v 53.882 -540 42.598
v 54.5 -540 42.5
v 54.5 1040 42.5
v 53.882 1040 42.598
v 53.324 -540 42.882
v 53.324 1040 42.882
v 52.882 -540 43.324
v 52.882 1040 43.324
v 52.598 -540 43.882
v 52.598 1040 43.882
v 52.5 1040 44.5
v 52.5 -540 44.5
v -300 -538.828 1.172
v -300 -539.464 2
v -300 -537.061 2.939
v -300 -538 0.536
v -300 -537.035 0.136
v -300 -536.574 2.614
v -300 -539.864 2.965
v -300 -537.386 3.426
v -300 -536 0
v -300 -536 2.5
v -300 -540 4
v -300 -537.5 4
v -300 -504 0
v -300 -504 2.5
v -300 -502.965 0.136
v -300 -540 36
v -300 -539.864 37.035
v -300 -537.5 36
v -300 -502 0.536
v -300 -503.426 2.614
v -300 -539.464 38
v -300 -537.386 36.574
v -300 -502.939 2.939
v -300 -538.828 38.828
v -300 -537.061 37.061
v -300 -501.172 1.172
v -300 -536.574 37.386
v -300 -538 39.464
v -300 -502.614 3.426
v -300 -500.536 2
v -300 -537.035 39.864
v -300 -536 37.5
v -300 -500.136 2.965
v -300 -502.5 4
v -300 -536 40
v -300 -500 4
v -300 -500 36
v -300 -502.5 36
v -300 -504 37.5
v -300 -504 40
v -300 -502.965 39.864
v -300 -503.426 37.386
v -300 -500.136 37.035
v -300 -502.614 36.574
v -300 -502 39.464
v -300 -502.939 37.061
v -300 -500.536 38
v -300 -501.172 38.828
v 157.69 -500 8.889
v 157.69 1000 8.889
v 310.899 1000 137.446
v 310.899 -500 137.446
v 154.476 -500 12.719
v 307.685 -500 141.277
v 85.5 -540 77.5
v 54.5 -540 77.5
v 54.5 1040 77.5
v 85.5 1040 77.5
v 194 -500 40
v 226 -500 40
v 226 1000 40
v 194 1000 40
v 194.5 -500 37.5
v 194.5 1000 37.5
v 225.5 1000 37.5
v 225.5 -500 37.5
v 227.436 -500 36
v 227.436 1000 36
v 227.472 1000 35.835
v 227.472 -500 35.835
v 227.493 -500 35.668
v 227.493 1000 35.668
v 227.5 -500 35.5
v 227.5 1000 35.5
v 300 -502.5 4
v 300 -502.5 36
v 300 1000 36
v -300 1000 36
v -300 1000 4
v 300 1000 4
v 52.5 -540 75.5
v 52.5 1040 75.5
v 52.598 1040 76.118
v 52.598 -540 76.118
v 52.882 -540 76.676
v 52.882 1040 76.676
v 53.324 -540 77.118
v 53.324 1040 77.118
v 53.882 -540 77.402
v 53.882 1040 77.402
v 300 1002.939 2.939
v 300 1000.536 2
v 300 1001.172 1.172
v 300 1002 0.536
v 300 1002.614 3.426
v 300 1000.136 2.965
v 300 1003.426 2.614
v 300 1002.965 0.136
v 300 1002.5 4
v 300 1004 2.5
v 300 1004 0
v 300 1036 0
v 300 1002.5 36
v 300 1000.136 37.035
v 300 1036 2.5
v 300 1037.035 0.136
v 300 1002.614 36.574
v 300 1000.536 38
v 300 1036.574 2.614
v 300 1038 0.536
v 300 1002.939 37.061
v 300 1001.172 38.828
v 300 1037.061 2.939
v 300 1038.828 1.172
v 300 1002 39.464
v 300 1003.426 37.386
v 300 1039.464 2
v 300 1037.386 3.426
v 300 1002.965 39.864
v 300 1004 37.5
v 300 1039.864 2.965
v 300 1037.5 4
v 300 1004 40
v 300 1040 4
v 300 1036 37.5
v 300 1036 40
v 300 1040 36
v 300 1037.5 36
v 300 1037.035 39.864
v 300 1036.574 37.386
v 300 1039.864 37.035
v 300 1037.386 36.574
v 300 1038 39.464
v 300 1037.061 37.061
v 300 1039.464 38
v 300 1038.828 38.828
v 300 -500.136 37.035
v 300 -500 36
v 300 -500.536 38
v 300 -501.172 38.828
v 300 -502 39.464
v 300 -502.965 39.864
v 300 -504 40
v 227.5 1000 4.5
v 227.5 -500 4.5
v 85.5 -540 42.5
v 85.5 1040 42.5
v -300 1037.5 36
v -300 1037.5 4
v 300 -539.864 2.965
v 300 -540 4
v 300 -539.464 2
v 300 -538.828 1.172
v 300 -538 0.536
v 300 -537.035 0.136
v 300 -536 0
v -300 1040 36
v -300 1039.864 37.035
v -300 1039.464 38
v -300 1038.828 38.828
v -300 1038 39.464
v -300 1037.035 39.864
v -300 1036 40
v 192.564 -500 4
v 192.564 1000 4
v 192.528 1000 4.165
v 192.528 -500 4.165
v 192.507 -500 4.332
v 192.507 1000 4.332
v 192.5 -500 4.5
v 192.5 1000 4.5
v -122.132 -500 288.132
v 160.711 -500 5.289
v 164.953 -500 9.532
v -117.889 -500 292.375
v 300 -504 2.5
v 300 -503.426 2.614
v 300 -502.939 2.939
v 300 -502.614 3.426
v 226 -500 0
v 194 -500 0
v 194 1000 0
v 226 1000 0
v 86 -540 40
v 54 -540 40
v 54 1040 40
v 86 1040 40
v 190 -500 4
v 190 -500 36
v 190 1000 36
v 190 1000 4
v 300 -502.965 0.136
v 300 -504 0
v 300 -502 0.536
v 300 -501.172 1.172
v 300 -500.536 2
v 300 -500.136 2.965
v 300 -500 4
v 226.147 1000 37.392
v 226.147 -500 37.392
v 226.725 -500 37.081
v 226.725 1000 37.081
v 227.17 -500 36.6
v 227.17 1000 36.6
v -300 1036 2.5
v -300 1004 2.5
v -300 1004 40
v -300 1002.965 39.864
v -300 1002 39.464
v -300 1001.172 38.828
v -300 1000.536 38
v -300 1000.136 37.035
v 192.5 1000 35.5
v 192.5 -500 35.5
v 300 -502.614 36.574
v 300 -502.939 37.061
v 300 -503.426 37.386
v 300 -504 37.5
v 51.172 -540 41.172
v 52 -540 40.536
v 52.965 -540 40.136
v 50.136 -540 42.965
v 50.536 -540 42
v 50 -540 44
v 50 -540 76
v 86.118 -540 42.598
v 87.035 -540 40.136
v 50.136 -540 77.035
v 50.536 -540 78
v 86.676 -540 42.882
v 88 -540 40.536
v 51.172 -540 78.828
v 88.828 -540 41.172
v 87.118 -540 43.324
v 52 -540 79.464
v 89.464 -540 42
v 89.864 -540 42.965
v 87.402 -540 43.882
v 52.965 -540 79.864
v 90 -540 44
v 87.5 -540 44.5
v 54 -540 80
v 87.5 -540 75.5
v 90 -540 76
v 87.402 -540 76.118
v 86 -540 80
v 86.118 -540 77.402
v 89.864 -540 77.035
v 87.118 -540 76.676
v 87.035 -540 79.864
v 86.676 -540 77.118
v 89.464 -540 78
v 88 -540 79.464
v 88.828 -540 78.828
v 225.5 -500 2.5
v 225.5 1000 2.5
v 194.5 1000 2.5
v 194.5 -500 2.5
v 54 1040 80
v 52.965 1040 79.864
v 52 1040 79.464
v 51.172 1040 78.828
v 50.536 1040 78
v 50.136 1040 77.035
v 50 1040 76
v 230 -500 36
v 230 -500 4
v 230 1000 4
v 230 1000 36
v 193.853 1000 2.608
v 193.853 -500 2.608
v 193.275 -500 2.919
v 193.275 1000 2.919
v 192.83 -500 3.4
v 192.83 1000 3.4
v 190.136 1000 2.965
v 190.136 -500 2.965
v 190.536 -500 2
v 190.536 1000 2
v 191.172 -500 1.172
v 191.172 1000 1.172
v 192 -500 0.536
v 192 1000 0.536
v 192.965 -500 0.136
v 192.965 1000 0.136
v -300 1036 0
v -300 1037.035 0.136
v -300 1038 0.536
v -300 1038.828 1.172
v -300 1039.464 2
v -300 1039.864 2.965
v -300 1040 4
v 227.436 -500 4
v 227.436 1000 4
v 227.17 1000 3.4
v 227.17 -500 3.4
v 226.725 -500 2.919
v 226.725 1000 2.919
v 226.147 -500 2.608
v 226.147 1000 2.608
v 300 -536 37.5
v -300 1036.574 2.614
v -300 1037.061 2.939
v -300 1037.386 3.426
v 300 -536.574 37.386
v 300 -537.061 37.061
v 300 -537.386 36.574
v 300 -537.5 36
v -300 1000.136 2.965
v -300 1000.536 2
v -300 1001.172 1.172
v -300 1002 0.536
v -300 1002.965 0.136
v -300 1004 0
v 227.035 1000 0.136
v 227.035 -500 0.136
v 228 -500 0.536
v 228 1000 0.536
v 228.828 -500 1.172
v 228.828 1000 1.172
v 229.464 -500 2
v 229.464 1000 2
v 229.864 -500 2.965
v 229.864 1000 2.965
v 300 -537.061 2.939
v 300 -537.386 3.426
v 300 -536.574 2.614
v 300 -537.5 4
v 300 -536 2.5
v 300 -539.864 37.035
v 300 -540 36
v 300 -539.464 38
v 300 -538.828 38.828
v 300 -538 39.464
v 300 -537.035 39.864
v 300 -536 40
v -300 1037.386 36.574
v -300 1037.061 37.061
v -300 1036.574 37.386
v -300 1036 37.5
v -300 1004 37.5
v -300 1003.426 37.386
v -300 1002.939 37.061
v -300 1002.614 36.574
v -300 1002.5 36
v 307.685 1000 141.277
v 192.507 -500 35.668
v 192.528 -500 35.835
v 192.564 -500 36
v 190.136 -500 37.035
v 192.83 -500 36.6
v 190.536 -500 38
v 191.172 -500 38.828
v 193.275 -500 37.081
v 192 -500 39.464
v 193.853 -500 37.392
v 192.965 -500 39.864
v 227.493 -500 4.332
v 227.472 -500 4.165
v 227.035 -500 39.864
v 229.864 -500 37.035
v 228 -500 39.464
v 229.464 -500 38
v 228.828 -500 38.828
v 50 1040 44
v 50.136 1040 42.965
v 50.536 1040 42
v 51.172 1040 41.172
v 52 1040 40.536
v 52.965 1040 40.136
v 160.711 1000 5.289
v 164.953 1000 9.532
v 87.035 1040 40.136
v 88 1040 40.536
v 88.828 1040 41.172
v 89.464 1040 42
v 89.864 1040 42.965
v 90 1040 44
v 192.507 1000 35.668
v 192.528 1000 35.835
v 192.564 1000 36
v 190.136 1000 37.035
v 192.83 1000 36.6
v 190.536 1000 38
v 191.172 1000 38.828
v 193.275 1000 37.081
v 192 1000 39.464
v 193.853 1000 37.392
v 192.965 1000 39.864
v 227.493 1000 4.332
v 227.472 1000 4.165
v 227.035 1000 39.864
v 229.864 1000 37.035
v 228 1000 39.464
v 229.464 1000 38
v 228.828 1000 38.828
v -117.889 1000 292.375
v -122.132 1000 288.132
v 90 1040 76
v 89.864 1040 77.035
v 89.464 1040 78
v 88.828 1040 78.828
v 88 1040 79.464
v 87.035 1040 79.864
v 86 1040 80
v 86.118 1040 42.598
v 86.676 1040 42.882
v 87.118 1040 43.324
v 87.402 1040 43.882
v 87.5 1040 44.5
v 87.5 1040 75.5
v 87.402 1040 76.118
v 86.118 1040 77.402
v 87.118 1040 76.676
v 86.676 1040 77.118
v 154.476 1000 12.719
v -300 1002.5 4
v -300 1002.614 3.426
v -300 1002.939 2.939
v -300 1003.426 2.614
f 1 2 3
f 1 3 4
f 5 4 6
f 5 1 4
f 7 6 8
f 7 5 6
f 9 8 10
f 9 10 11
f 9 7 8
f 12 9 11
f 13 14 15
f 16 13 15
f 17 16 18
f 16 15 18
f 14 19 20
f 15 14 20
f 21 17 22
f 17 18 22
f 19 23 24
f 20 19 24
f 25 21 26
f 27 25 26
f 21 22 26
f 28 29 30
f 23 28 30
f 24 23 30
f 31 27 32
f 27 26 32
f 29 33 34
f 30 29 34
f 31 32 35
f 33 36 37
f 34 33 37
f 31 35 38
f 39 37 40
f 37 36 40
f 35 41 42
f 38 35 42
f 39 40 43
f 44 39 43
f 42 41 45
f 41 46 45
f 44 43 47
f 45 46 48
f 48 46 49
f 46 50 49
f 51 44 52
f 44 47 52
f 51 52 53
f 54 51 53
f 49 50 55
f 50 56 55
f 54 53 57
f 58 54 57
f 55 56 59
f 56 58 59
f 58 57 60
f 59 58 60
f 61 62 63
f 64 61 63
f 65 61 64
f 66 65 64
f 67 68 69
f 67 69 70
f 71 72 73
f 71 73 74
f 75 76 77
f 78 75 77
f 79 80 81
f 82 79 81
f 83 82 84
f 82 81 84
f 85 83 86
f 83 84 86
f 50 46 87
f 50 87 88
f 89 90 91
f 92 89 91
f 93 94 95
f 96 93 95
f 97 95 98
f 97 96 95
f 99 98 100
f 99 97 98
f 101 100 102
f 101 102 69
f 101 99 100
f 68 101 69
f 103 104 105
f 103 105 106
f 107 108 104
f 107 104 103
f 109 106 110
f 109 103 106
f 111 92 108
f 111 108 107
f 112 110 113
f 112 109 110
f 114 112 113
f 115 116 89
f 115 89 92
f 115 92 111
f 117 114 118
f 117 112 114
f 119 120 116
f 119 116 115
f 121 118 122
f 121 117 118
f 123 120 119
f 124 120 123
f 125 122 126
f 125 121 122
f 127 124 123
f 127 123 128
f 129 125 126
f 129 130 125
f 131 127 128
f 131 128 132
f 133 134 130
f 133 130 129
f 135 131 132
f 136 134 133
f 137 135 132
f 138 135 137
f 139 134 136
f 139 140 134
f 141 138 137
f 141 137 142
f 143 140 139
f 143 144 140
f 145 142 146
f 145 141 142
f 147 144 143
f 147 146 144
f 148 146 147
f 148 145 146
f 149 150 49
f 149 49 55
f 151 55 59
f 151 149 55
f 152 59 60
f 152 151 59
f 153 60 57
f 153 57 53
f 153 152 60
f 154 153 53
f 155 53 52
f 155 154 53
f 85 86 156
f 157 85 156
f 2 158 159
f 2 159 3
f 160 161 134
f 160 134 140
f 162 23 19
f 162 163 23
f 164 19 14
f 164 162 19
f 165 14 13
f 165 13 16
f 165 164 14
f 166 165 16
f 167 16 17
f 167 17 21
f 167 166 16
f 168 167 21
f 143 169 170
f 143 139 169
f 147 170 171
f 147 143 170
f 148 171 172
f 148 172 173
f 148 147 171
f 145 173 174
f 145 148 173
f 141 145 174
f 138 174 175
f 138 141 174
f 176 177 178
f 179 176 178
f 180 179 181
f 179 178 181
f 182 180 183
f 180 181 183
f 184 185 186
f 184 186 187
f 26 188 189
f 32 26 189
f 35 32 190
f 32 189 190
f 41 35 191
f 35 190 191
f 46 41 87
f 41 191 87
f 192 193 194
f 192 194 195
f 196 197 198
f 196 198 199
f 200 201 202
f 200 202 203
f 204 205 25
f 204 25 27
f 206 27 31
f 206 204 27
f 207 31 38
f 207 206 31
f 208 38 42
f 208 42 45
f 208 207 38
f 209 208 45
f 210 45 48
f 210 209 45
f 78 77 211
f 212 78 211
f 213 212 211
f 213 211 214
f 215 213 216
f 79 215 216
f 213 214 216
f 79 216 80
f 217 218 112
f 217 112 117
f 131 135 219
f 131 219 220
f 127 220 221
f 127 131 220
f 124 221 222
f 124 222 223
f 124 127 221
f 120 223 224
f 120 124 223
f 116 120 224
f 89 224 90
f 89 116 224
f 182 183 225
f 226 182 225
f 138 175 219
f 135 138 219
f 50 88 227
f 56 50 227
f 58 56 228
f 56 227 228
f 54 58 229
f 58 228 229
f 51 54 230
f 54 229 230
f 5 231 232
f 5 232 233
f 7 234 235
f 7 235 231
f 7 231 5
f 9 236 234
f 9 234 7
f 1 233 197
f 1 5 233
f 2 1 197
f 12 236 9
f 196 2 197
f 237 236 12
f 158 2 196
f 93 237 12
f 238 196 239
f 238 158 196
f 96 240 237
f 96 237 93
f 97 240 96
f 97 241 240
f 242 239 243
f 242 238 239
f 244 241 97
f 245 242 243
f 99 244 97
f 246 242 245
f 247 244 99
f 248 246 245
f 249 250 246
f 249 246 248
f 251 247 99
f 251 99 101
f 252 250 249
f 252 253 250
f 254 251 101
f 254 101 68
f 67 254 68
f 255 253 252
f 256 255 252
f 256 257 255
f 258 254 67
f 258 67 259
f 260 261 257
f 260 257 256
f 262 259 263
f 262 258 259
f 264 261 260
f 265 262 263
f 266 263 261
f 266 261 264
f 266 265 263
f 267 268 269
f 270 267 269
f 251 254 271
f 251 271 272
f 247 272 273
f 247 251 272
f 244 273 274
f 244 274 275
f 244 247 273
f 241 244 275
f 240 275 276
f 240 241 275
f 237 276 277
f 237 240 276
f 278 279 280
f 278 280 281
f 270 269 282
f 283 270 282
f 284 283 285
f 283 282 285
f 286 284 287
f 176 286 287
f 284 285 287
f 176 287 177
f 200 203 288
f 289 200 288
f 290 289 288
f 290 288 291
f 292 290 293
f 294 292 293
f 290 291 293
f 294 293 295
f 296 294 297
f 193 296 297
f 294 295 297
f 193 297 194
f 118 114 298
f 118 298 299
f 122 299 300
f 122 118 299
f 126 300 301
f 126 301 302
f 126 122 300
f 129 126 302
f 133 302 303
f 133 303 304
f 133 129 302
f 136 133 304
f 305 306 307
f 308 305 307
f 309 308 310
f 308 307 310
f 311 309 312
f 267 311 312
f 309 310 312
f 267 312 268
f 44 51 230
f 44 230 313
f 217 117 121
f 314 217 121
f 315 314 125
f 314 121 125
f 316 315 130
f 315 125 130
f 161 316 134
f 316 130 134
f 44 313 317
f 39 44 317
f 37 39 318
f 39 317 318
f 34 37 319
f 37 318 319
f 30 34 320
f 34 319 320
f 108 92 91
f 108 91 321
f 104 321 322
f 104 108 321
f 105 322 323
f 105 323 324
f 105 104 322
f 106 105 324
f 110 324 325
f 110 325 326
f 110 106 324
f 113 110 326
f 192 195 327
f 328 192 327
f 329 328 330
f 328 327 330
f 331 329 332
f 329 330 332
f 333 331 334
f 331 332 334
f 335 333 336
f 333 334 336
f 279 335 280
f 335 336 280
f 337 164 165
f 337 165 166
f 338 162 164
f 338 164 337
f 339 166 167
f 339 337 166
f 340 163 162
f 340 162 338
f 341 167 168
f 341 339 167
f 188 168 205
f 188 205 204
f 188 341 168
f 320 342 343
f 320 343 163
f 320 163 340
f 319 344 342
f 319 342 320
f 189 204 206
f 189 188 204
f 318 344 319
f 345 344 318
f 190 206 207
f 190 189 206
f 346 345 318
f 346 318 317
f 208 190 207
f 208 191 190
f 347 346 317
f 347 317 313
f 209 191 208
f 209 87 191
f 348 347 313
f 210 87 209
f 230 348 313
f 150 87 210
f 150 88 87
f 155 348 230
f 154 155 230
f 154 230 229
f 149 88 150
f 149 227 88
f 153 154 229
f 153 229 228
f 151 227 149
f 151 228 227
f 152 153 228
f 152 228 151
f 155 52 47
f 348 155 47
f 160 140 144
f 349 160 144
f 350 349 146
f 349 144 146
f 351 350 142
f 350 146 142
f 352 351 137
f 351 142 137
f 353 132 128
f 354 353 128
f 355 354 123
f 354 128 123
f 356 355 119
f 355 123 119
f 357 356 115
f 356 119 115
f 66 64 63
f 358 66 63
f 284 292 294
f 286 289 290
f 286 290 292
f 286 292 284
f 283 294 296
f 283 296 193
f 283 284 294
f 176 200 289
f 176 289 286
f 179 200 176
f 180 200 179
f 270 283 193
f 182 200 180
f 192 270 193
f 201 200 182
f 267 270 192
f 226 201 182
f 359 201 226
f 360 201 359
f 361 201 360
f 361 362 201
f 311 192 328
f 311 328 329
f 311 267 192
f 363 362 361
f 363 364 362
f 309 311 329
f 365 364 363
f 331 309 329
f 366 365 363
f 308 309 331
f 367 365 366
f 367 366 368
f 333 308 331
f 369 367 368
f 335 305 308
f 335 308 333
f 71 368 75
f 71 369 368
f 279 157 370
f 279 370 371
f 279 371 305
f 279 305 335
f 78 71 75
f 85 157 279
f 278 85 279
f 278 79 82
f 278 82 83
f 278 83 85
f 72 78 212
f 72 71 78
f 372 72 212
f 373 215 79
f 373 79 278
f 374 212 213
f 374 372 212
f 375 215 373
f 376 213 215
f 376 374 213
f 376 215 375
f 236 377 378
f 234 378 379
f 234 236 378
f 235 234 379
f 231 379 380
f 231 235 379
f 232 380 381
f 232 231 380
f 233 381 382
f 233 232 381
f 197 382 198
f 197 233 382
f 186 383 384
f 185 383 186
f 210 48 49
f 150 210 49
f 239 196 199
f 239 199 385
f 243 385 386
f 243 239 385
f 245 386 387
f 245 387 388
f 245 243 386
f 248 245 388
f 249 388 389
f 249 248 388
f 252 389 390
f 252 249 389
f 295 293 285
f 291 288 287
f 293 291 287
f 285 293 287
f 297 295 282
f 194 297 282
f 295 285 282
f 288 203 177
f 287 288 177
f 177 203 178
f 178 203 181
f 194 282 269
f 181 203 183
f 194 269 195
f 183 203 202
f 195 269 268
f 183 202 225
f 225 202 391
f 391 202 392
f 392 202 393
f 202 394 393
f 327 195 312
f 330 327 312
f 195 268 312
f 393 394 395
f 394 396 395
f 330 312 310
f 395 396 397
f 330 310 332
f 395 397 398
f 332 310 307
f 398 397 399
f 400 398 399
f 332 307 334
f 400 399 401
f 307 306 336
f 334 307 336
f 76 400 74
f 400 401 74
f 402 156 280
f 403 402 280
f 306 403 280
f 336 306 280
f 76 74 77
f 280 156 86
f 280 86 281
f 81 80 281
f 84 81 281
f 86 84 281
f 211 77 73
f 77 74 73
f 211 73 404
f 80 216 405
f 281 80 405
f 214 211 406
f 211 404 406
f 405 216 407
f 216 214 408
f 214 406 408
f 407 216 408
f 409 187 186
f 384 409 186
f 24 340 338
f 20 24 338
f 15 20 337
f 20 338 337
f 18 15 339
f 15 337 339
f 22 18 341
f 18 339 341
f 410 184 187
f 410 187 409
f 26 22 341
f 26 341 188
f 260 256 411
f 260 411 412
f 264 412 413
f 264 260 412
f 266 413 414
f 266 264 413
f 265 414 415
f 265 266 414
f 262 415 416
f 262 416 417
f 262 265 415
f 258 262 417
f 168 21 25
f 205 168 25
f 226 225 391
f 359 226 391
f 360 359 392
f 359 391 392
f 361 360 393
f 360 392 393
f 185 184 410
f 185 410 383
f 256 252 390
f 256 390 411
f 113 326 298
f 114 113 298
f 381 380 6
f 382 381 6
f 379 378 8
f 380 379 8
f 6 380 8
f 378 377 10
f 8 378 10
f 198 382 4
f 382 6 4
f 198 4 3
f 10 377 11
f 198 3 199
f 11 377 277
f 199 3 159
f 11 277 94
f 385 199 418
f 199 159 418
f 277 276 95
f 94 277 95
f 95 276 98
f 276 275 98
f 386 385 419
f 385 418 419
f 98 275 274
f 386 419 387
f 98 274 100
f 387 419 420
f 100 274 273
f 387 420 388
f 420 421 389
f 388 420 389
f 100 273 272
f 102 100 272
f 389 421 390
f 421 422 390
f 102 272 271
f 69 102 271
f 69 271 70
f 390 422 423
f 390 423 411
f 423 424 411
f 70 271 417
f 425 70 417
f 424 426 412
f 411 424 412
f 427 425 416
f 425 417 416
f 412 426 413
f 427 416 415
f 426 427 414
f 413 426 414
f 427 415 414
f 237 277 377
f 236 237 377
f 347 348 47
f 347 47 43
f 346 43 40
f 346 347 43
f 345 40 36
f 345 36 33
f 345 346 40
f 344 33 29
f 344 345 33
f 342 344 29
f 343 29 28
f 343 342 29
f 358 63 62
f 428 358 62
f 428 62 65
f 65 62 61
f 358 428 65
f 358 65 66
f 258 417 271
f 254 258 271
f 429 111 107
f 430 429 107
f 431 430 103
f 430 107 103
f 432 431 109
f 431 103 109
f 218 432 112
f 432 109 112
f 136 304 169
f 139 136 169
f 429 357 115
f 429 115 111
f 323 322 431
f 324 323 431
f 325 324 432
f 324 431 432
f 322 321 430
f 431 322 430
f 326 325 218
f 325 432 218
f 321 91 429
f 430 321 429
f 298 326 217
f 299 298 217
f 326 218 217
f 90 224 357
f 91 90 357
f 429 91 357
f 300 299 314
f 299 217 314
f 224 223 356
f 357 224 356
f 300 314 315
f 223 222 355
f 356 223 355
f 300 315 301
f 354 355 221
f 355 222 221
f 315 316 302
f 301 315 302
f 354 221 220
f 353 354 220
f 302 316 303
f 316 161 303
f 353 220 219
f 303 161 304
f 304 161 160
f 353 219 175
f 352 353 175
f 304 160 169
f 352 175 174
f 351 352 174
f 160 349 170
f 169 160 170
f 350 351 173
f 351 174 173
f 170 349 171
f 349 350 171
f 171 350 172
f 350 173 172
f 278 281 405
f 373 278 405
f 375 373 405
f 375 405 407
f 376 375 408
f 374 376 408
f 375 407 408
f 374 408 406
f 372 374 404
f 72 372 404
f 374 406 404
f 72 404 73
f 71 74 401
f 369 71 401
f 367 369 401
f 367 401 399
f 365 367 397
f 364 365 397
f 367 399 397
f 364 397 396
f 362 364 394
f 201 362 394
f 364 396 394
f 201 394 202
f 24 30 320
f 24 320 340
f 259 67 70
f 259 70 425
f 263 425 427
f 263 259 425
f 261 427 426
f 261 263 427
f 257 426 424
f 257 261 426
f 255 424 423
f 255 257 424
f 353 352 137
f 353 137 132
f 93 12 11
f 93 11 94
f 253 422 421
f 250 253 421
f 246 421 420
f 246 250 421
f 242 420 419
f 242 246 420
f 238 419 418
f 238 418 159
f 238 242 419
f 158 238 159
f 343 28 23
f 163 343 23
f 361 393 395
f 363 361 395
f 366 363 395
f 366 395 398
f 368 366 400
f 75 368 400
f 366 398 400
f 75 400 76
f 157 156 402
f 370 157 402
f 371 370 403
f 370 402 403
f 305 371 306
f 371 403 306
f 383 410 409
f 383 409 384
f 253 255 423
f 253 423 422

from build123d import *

# Parameters (mm, degrees)
F1_DEPTH  = 300
F2_T      = -2.5
F2_2_T    = -2.5
F4_DEPTH  = 1000
F6_DEPTH  = 1580
F8_DEPTH  = 1500
F13_DEPTH = 6
F14_DEPTH = 5


with BuildPart() as f1:
    # F0 (on Right) → F1 (new body, symmetric)
    with BuildSketch(Plane.YZ):
        with BuildLine():
            Line((-536, 0), (-504, 0))
            ThreePointArc((-504, 0), (-501.1715728753, 1.1715728753), (-500, 4))
            Line((-500, 4), (-500, 36))
            ThreePointArc((-500, 36), (-501.1715728753, 38.8284271247), (-504, 40))
            Line((-504, 40), (-536, 40))
            ThreePointArc((-536, 40), (-538.8284271247, 38.8284271247), (-540, 36))
            Line((-540, 36), (-540, 4))
            ThreePointArc((-540, 4), (-538.8284271247, 1.1715728753), (-536, 0))
        make_face()
    extrude(amount=F1_DEPTH, both=True)

    # F2
    f2_openings = [f1.faces().sort_by_distance(p)[0] for p in [
        (300, -520, 20),
    ]]
    offset(amount=F2_T, openings=f2_openings)


with BuildPart() as f1b:
    # F0 (on Right) → F1, piece 2 (new body, symmetric)
    with BuildSketch(Plane.YZ):
        with BuildLine():
            Line((1036, 40), (1004, 40))
            ThreePointArc((1004, 40), (1001.1715728753, 38.8284271247), (1000, 36))
            Line((1000, 36), (1000, 4))
            ThreePointArc((1000, 4), (1001.1715728753, 1.1715728753), (1004, 0))
            Line((1004, 0), (1036, 0))
            ThreePointArc((1036, 0), (1038.8284271247, 1.1715728753), (1040, 4))
            Line((1040, 4), (1040, 36))
            ThreePointArc((1040, 36), (1038.8284271247, 38.8284271247), (1036, 40))
        make_face()
    extrude(amount=F1_DEPTH, both=True)

    # F2#2
    f2_2_openings = [f1b.faces().sort_by_distance(p)[0] for p in [
        (300, 1020, 20),
    ]]
    offset(amount=F2_2_T, openings=f2_2_openings)


with BuildPart() as f4_tool:
    # F3 (on face) → F4 (new body)
    with BuildSketch(Plane.YZ.offset(300)):
        with BuildLine():
            Line((1002.5, 36), (1002.5, 4))
            ThreePointArc((1002.5, 4), (1002.9393398282, 2.9393398282), (1004, 2.5))
            Line((1004, 2.5), (1036, 2.5))
            ThreePointArc((1036, 2.5), (1037.0606601718, 2.9393398282), (1037.5, 4))
            Line((1037.5, 4), (1037.5, 36))
            ThreePointArc((1037.5, 36), (1037.0606601718, 37.0606601718), (1036, 37.5))
            Line((1036, 37.5), (1004, 37.5))
            ThreePointArc((1004, 37.5), (1002.9393398282, 37.0606601718), (1002.5, 36))
        make_face()
        with BuildLine():
            Line((-502.5, 4), (-502.5, 36))
            ThreePointArc((-502.5, 36), (-502.9393398282, 37.0606601718), (-504, 37.5))
            Line((-504, 37.5), (-536, 37.5))
            ThreePointArc((-536, 37.5), (-537.0606601718, 37.0606601718), (-537.5, 36))
            Line((-537.5, 36), (-537.5, 4))
            ThreePointArc((-537.5, 4), (-537.0606601718, 2.9393398282), (-536, 2.5))
            Line((-536, 2.5), (-504, 2.5))
            ThreePointArc((-504, 2.5), (-502.9393398282, 2.9393398282), (-502.5, 4))
        make_face()
    extrude(amount=-F4_DEPTH)


with BuildPart() as f1_1:
    add(f1.part)

    # F4: cut by f4_tool
    add(f4_tool.part, mode=Mode.SUBTRACT)


with BuildPart() as f1b_1:
    add(f1b.part)

    # F4: cut by f4_tool
    add(f4_tool.part, mode=Mode.SUBTRACT)


with BuildPart() as f6:
    # F5 (on face) → F6 (new body, through all)
    with BuildSketch(Plane.XZ.offset(540)):
        with BuildLine():
            Line((54, 40), (86, 40))
            ThreePointArc((86, 40), (88.8284271247, 41.1715728753), (90, 44))
            Line((90, 44), (90, 76))
            ThreePointArc((90, 76), (88.8284271247, 78.8284271247), (86, 80))
            Line((86, 80), (54, 80))
            ThreePointArc((54, 80), (51.1715728753, 78.8284271247), (50, 76))
            Line((50, 76), (50, 44))
            ThreePointArc((50, 44), (51.1715728753, 41.1715728753), (54, 40))
        make_face()
        with BuildLine():
            ThreePointArc((52.5, 75.5), (53.0857864376, 76.9142135624), (54.5, 77.5))
            Line((54.5, 77.5), (85.5, 77.5))
            ThreePointArc((85.5, 77.5), (86.9142135624, 76.9142135624), (87.5, 75.5))
            Line((87.5, 75.5), (87.5, 44.5))
            ThreePointArc((87.5, 44.5), (86.9142135624, 43.0857864376), (85.5, 42.5))
            Line((85.5, 42.5), (54.5, 42.5))
            ThreePointArc((54.5, 42.5), (53.0857864376, 43.0857864376), (52.5, 44.5))
            Line((52.5, 44.5), (52.5, 75.5))
        make_face(mode=Mode.SUBTRACT)
    extrude(amount=-F6_DEPTH)


with BuildPart() as f8:
    # F7 (on face) → F8 (new body, through all)
    with BuildSketch(Plane.XZ.offset(-1000)):
        with BuildLine():
            ThreePointArc((230, 36), (228.8284271247, 38.8284271247), (226, 40))
            Line((226, 40), (194, 40))
            ThreePointArc((194, 40), (191.1715728753, 38.8284271247), (190, 36))
            Line((190, 36), (192.5635083269, 36))
            ThreePointArc((192.5635083269, 36), (193.2752551286, 37.0811388301), (194.5, 37.5))
            Line((194.5, 37.5), (225.5, 37.5))
            ThreePointArc((225.5, 37.5), (226.7247448714, 37.0811388301), (227.4364916731, 36))
            Line((227.4364916731, 36), (230, 36))
        make_face()
        with BuildLine():
            Line((192.5635083269, 36), (190, 36))
            Line((190, 36), (190, 4))
            Line((190, 4), (192.5635083269, 4))
            ThreePointArc((192.5635083269, 4), (192.5159406075, 4.247991415), (192.5, 4.5))
            Line((192.5, 4.5), (192.5, 35.5))
            ThreePointArc((192.5, 35.5), (192.5159406075, 35.752008585), (192.5635083269, 36))
        make_face()
        with BuildLine():
            ThreePointArc((226, 0), (228.8284271247, 1.1715728753), (230, 4))
            Line((230, 4), (227.4364916731, 4))
            ThreePointArc((227.4364916731, 4), (226.7247448714, 2.9188611699), (225.5, 2.5))
            Line((225.5, 2.5), (194.5, 2.5))
            ThreePointArc((194.5, 2.5), (193.2752551286, 2.9188611699), (192.5635083269, 4))
            Line((192.5635083269, 4), (190, 4))
            ThreePointArc((190, 4), (191.1715728753, 1.1715728753), (194, 0))
            Line((194, 0), (226, 0))
        make_face()
        with BuildLine():
            Line((230, 4), (230, 36))
            Line((230, 36), (227.4364916731, 36))
            ThreePointArc((227.4364916731, 36), (227.4840593925, 35.752008585), (227.5, 35.5))
            Line((227.5, 35.5), (227.5, 4.5))
            ThreePointArc((227.5, 4.5), (227.4840593925, 4.247991415), (227.4364916731, 4))
            Line((227.4364916731, 4), (230, 4))
        make_face()
    extrude(amount=F8_DEPTH)


with BuildPart() as f13:
    # F10 (on face) → F13 (new body)
    with BuildSketch(Plane(origin=(83, 0, 83), x_dir=(0.7071067812, 0, -0.7071067812), z_dir=(-0.7071067812, 0, -0.7071067812))):
        Polygon((109.8994949366, -1000), (109.8994949366, 500), (-237.5878784787, 500), (-290.1005050634, 500), (-290.1005050634, -1000), (-237.5878784787, -1000), align=None)
    extrude(amount=-F13_DEPTH)


with BuildPart() as f14:
    # F12 (on face) → F14 (new body)
    with BuildSketch(Plane(origin=(60.7768835674, 0, -72.4310693382), x_dir=(0.7660444431, 0, 0.6427876097), z_dir=(-0.6427876097, 0, 0.7660444431))):
        Polygon((126.5114324917, 1000), (126.5114324917, -500), (326.5114324917, -500), (326.5114324917, 1000), (252.9536868844, 1000), align=None)
    extrude(amount=F14_DEPTH)


solid = Compound([f1_1.part, f1b_1.part, f6.part, f8.part, f13.part, f14.part])
